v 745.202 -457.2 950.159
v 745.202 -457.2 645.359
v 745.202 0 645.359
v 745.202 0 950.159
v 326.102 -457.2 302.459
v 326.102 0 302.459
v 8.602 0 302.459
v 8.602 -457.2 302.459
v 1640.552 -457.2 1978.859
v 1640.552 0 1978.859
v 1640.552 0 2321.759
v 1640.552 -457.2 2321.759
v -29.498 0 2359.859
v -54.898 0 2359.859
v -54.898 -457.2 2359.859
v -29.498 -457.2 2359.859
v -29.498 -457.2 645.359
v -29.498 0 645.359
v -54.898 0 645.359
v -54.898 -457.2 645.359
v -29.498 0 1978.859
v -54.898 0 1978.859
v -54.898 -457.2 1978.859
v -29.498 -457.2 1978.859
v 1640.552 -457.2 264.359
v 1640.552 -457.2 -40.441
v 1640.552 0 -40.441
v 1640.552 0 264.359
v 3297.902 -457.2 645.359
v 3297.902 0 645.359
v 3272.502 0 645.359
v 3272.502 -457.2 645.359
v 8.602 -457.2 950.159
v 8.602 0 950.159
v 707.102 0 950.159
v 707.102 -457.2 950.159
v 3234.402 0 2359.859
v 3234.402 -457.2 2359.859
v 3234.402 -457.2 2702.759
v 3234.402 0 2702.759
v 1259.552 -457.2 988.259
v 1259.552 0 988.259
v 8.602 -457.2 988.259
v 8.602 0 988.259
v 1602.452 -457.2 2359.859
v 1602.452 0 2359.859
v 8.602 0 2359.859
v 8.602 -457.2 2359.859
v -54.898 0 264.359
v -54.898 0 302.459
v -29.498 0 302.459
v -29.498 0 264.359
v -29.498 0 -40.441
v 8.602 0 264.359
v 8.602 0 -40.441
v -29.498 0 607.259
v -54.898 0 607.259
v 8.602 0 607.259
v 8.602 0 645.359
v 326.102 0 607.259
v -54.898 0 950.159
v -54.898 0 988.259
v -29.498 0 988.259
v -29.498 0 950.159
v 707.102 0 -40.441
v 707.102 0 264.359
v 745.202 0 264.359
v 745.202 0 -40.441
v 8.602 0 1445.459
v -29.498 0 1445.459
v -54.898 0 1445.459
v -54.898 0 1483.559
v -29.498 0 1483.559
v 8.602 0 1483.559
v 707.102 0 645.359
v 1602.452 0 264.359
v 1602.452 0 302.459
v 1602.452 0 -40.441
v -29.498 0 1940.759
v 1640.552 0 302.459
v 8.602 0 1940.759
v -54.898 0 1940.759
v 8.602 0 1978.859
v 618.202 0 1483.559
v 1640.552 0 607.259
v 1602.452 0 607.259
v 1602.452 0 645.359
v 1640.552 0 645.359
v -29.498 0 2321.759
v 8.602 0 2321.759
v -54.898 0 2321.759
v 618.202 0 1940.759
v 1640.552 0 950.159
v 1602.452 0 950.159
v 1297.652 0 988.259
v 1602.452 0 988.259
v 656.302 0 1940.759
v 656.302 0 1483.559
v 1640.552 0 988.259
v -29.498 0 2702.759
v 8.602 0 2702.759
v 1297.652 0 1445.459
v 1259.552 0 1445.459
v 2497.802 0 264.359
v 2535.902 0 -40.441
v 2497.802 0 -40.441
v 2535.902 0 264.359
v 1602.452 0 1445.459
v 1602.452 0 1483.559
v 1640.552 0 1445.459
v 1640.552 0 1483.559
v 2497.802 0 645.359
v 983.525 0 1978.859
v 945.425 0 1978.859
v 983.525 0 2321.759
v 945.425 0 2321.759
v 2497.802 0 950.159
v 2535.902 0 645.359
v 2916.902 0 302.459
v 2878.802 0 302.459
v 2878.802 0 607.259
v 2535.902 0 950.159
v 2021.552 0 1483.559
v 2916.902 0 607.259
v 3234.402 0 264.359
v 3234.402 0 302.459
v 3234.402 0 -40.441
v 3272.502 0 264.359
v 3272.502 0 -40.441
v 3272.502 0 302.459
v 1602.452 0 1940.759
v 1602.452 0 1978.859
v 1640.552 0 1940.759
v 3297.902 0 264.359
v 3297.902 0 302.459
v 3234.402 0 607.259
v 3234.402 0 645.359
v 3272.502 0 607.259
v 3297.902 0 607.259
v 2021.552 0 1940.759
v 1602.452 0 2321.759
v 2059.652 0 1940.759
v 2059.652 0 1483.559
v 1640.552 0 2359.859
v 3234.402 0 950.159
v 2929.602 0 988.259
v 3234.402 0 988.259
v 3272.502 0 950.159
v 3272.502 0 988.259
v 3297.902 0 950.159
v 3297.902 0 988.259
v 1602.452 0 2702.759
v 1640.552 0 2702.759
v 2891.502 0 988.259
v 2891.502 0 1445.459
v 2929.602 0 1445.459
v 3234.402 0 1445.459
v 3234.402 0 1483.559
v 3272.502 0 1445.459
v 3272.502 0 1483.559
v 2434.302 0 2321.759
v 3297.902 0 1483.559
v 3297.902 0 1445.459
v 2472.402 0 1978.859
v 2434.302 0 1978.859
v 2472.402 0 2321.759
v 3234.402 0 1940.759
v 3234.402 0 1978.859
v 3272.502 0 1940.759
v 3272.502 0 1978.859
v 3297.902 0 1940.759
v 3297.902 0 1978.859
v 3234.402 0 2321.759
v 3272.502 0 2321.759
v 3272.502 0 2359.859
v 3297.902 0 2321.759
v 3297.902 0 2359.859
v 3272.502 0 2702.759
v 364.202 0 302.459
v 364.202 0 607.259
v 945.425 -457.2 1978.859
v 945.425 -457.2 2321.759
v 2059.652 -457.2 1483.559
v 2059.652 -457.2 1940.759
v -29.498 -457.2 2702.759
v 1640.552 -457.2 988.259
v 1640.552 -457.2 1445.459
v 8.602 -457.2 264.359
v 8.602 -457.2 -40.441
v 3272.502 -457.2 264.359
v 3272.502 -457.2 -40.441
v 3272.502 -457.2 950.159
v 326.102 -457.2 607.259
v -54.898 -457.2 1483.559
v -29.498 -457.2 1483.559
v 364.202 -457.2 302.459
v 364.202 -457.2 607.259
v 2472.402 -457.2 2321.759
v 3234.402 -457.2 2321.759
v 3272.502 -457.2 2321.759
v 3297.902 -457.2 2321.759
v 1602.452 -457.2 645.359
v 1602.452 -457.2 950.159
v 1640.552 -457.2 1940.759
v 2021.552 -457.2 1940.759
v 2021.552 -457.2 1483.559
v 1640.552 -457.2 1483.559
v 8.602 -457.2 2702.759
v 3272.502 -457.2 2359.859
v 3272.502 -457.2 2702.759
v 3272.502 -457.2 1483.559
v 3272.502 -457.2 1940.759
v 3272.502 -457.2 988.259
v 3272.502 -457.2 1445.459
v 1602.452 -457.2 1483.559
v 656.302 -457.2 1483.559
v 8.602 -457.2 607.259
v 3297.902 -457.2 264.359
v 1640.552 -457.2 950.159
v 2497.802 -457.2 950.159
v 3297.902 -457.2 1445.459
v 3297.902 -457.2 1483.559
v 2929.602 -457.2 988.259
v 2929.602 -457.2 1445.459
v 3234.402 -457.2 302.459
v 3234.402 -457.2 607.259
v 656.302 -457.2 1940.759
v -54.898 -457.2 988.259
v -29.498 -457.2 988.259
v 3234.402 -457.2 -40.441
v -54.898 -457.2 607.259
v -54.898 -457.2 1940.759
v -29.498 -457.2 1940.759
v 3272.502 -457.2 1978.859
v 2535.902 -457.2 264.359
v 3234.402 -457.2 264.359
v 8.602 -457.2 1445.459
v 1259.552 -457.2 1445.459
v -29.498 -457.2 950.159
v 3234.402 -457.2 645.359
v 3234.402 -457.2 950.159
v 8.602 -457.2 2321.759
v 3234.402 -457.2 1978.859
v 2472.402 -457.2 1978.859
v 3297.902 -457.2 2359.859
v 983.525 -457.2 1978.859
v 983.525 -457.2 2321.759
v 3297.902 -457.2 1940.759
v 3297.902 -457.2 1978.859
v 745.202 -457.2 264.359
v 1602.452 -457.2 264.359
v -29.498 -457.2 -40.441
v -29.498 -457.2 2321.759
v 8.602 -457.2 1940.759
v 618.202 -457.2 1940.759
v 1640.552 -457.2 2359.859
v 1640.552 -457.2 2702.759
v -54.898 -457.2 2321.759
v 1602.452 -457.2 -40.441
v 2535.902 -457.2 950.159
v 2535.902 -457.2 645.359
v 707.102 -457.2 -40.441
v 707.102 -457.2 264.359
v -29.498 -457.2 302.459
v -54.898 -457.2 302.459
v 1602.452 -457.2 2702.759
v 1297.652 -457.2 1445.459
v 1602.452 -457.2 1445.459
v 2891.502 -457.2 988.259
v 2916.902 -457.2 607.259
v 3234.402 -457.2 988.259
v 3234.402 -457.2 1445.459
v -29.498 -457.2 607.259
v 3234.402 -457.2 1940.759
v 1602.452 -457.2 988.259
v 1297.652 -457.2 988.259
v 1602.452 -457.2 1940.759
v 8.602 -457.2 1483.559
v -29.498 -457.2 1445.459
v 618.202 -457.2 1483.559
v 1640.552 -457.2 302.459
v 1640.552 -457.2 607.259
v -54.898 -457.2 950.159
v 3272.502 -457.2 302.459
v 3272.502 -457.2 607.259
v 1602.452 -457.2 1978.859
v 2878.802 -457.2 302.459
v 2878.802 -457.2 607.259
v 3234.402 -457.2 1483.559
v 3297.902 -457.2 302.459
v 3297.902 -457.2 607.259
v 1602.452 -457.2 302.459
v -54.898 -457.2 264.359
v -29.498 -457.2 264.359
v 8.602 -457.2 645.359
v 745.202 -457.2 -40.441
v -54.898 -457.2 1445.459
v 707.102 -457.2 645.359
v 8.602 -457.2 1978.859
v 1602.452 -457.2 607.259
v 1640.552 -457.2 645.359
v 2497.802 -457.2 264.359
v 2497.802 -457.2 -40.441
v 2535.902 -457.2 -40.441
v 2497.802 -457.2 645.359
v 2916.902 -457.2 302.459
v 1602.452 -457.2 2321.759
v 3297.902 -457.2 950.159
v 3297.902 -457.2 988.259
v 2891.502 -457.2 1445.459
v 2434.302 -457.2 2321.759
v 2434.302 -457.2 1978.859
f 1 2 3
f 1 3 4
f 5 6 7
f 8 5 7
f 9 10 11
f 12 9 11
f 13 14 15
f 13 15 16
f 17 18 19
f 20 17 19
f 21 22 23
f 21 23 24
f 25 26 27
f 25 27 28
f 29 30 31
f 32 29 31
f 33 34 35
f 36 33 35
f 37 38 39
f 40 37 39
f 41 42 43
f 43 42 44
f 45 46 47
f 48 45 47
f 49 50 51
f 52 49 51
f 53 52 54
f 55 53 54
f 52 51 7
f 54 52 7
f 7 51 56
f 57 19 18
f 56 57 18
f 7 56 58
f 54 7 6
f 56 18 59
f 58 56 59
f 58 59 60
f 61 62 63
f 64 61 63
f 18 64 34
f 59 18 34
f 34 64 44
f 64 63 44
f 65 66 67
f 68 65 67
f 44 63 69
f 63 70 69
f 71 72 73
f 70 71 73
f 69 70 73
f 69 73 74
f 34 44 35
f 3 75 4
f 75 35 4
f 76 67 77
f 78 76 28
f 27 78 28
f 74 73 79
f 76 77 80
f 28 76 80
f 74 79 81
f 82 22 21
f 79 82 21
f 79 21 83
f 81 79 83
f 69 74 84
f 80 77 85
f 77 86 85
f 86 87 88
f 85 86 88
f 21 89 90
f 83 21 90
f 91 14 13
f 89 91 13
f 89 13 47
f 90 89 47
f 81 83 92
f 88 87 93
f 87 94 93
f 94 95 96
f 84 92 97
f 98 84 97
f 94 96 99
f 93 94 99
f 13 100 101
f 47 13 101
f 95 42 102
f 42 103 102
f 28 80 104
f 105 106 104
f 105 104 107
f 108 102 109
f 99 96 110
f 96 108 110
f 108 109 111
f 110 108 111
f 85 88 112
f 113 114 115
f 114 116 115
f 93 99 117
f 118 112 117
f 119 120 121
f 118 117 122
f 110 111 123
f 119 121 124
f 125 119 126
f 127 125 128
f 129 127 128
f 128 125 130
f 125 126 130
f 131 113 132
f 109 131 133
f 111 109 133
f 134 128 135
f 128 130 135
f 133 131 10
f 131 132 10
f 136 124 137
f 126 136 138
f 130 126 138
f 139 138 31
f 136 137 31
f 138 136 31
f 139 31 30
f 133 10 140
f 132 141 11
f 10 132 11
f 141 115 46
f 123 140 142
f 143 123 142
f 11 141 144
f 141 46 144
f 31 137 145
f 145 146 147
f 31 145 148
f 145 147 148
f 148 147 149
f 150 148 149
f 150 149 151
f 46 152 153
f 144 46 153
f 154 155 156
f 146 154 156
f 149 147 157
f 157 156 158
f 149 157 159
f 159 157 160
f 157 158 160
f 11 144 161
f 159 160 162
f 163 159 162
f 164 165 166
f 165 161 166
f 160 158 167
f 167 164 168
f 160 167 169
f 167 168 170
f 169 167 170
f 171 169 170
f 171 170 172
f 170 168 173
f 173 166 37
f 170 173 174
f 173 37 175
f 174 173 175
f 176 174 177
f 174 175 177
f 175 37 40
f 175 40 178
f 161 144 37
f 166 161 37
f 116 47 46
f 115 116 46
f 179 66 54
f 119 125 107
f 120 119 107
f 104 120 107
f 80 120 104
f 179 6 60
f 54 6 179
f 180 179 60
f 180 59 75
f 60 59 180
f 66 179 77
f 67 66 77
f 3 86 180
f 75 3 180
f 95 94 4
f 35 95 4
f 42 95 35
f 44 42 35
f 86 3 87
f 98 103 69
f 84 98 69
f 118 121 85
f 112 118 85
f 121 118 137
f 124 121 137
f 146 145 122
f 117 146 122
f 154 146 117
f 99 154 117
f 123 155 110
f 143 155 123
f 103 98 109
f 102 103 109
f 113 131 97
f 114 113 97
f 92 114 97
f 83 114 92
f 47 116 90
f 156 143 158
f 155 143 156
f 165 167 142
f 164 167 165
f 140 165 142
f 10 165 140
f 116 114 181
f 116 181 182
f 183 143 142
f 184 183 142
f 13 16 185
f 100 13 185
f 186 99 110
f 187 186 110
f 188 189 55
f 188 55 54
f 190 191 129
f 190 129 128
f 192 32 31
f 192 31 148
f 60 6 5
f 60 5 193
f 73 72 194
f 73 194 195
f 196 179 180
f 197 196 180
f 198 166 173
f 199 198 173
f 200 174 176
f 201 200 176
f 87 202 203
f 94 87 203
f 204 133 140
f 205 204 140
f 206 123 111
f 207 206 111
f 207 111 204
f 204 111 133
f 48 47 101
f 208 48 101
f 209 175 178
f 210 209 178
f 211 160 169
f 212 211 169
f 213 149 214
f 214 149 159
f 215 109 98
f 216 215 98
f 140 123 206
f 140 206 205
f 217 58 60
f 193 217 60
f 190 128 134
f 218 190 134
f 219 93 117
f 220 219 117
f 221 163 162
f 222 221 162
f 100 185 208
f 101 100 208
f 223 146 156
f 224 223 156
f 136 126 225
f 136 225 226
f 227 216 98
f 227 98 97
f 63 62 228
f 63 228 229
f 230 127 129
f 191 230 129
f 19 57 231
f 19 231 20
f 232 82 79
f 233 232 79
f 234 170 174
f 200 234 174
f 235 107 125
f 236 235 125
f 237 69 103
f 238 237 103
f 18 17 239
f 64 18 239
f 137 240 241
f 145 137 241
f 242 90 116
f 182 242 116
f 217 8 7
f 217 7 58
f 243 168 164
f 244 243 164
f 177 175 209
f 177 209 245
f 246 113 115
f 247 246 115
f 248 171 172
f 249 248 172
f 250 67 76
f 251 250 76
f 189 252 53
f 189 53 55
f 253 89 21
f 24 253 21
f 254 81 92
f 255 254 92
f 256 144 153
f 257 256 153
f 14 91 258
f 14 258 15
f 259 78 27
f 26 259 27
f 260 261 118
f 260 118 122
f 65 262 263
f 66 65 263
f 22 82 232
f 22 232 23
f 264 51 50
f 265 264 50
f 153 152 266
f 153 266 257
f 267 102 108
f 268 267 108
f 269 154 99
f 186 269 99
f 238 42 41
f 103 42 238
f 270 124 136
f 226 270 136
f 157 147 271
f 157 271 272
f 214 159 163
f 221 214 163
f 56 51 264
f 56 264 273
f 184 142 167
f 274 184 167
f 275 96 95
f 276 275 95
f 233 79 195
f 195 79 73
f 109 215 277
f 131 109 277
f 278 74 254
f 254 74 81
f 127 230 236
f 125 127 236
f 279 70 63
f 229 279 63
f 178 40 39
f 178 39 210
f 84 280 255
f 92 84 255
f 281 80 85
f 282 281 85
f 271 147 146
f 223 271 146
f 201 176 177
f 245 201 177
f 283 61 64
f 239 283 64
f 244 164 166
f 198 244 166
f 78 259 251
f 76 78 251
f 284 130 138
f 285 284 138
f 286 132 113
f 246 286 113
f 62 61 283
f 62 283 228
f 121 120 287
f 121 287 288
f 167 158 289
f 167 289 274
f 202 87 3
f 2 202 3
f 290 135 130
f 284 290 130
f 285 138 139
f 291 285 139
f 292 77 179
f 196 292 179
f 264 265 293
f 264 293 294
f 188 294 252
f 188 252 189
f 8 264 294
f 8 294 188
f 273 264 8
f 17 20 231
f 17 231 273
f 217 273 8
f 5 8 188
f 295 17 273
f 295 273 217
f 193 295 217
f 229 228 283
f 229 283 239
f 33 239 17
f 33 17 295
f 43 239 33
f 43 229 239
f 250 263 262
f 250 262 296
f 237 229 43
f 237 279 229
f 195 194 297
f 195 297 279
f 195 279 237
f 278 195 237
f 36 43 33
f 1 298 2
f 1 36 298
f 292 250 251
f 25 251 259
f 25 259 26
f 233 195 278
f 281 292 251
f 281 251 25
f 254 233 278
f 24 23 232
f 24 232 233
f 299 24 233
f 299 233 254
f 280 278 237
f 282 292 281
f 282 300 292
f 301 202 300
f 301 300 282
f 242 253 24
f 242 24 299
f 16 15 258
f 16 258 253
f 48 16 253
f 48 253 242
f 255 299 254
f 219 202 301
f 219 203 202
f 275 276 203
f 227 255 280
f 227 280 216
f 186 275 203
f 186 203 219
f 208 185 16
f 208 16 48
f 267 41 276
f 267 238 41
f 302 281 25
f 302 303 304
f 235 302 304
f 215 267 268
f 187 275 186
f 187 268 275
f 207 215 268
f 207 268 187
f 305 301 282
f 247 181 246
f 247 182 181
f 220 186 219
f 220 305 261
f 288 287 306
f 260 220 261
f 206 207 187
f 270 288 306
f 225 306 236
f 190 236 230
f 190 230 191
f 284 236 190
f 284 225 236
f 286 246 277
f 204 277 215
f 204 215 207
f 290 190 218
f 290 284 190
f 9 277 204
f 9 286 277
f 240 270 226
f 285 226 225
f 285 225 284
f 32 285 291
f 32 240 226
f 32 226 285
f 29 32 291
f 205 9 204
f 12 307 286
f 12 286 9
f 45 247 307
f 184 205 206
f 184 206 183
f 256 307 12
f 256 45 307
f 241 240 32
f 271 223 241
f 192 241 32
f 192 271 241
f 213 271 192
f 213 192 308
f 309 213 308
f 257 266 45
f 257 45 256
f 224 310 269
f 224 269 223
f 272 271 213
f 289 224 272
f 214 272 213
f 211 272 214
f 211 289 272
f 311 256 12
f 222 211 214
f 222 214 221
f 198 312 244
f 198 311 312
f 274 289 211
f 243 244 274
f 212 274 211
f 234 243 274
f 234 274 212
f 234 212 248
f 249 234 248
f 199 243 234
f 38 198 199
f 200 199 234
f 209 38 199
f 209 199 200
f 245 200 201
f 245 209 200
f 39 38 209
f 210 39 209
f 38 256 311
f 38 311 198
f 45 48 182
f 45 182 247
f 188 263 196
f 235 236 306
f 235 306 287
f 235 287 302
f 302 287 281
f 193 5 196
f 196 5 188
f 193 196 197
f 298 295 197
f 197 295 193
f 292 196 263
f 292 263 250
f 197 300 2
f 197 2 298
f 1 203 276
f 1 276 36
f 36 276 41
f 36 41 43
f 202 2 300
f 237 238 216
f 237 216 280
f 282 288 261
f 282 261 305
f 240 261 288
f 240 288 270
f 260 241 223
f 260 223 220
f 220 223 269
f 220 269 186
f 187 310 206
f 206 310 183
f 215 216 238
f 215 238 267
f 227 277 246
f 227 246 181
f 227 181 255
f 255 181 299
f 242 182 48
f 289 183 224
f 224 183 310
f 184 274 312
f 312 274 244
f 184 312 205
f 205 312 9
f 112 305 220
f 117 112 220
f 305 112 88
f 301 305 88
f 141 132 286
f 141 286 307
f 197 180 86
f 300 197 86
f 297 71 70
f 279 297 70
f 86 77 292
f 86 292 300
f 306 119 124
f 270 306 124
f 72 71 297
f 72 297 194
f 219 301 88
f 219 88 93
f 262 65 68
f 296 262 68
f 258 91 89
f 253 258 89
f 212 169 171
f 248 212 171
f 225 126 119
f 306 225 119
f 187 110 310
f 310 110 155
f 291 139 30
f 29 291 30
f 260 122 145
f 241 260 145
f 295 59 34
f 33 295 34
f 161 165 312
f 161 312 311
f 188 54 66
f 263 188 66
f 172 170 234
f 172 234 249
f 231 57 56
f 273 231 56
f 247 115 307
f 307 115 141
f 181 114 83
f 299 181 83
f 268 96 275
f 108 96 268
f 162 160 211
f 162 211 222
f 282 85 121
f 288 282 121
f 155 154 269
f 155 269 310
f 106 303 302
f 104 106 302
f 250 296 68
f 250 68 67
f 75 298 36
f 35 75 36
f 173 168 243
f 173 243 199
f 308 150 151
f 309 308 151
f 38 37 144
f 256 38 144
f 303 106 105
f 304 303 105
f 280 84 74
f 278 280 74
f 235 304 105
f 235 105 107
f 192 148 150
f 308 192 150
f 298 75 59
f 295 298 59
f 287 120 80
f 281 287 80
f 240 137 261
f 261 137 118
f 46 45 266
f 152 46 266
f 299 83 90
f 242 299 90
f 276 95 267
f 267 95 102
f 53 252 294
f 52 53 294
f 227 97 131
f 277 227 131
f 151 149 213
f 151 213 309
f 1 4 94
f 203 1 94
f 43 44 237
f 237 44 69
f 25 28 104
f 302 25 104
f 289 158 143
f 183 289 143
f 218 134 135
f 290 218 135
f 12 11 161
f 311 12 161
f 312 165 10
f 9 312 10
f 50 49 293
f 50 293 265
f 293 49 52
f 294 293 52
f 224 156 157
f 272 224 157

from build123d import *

# Parameters (mm, degrees)
F0_W     = 38.1
F0_H     = 342.9
F0_W_2   = 25.4
F0_H_2   = 38.1
F0_H_3   = 457.2
F0_H_4   = 304.8
F1_DEPTH = 457.2


with BuildPart() as f1:
    # F0 (on Front) → F1 (new body)
    with BuildSketch(Plane.XZ):
        with Locations((-10.4476883292, 2531.308583796)):
            Rectangle(F0_W, F0_H)
        with Locations((-42.1976883292, 2340.808583796)):
            Rectangle(F0_W_2, F0_H_2)
        with Locations((-10.4476883292, 2340.808583796)):
            Rectangle(F0_W, F0_H_2)
        Polygon((1602.4523116708, 2359.858583796), (8.6023116708, 2359.858583796), (8.6023116708, 2321.758583796), (945.4248547554, 2321.758583796), (983.5248547554, 2321.758583796), (1602.4523116708, 2321.758583796), align=None)
        with Locations((-10.4476883292, 2150.308583796)):
            Rectangle(F0_W, F0_H)
        with Locations((1621.5023116708, 2531.308583796)):
            Rectangle(F0_W, F0_H)
        with Locations((1621.5023116708, 2340.808583796)):
            Rectangle(F0_W, F0_H_2)
        Polygon((3234.4023116708, 2359.858583796), (1640.5523116708, 2359.858583796), (1640.5523116708, 2321.758583796), (2434.3023116708, 2321.758583796), (2472.4023116708, 2321.758583796), (3234.4023116708, 2321.758583796), align=None)
        with Locations((1621.5023116708, 2150.308583796)):
            Rectangle(F0_W, F0_H)
        with Locations((964.4748547554, 2150.308583796)):
            Rectangle(F0_W, F0_H)
        Polygon((945.4248547554, 1978.858583796), (8.6023116708, 1978.858583796), (8.6023116708, 1940.758583796), (618.2023116708, 1940.758583796), (656.3023116708, 1940.758583796), (1602.4523116708, 1940.758583796), (1602.4523116708, 1978.858583796), (983.5248547554, 1978.858583796), align=None)
        with Locations((-10.4476883292, 1959.808583796)):
            Rectangle(F0_W, F0_H_2)
        with Locations((-42.1976883292, 1959.808583796)):
            Rectangle(F0_W_2, F0_H_2)
        with Locations((-10.4476883292, 1712.158583796)):
            Rectangle(F0_W, F0_H_3)
        with Locations((637.2523116708, 1712.158583796)):
            Rectangle(F0_W, F0_H_3)
        with Locations((-10.4476883292, 1464.508583796)):
            Rectangle(F0_W, F0_H_2)
        Polygon((618.2023116708, 1483.558583796), (8.6023116708, 1483.558583796), (8.6023116708, 1445.458583796), (1259.5523116708, 1445.458583796), (1297.6523116708, 1445.458583796), (1602.4523116708, 1445.458583796), (1602.4523116708, 1483.558583796), (656.3023116708, 1483.558583796), align=None)
        with Locations((-10.4476883292, 1216.858583796)):
            Rectangle(F0_W, F0_H_3)
        with Locations((-42.1976883292, 1464.508583796)):
            Rectangle(F0_W_2, F0_H_2)
        with Locations((-42.1976883292, 969.208583796)):
            Rectangle(F0_W_2, F0_H_2)
        with Locations((-42.1976883292, 626.308583796)):
            Rectangle(F0_W_2, F0_H_2)
        with Locations((-10.4476883292, 111.958583796)):
            Rectangle(F0_W, F0_H_4)
        with Locations((-42.1976883292, 283.408583796)):
            Rectangle(F0_W_2, F0_H_2)
        with Locations((-10.4476883292, 283.408583796)):
            Rectangle(F0_W, F0_H_2)
        with Locations((-10.4476883292, 454.858583796)):
            Rectangle(F0_W, F0_H_4)
        with Locations((-10.4476883292, 626.308583796)):
            Rectangle(F0_W, F0_H_2)
        with Locations((-10.4476883292, 797.758583796)):
            Rectangle(F0_W, F0_H_4)
        Polygon((707.1023116708, 645.358583796), (8.6023116708, 645.358583796), (8.6023116708, 607.258583796), (326.1023116708, 607.258583796), (364.2023116708, 607.258583796), (1602.4523116708, 607.258583796), (1640.5523116708, 607.258583796), (2878.8023116708, 607.258583796), (2916.9023116708, 607.258583796), (3234.4023116708, 607.258583796), (3234.4023116708, 645.358583796), (2535.9023116708, 645.358583796), (2497.8023116708, 645.358583796), (1640.5523116708, 645.358583796), (1602.4523116708, 645.358583796), (745.2023116708, 645.358583796), align=None)
        Polygon((1259.5523116708, 988.258583796), (8.6023116708, 988.258583796), (8.6023116708, 950.158583796), (707.1023116708, 950.158583796), (745.2023116708, 950.158583796), (1602.4523116708, 950.158583796), (1602.4523116708, 988.258583796), (1297.6523116708, 988.258583796), align=None)
        with Locations((726.1523116708, 797.758583796)):
            Rectangle(F0_W, F0_H_4)
        with Locations((-10.4476883292, 969.208583796)):
            Rectangle(F0_W, F0_H_2)
        with Locations((345.1523116708, 454.858583796)):
            Rectangle(F0_W, F0_H_4)
        Polygon((326.1023116708, 302.458583796), (8.6023116708, 302.458583796), (8.6023116708, 264.358583796), (707.1023116708, 264.358583796), (745.2023116708, 264.358583796), (1602.4523116708, 264.358583796), (1640.5523116708, 264.358583796), (2497.8023116708, 264.358583796), (2535.9023116708, 264.358583796), (3234.4023116708, 264.358583796), (3234.4023116708, 302.458583796), (2916.9023116708, 302.458583796), (2878.8023116708, 302.458583796), (1640.5523116708, 302.458583796), (1602.4523116708, 302.458583796), (364.2023116708, 302.458583796), align=None)
        with Locations((726.1523116708, 111.958583796)):
            Rectangle(F0_W, F0_H_4)
        with Locations((1278.6023116708, 1216.858583796)):
            Rectangle(F0_W, F0_H_3)
        with Locations((1621.5023116708, 1959.808583796)):
            Rectangle(F0_W, F0_H_2)
        with Locations((1621.5023116708, 1712.158583796)):
            Rectangle(F0_W, F0_H_3)
        with Locations((1621.5023116708, 1464.508583796)):
            Rectangle(F0_W, F0_H_2)
        with Locations((1621.5023116708, 1216.858583796)):
            Rectangle(F0_W, F0_H_3)
        with Locations((1621.5023116708, 969.208583796)):
            Rectangle(F0_W, F0_H_2)
        with Locations((1621.5023116708, 797.758583796)):
            Rectangle(F0_W, F0_H_4)
        with Locations((1621.5023116708, 454.858583796)):
            Rectangle(F0_W, F0_H_4)
        with Locations((1621.5023116708, 111.958583796)):
            Rectangle(F0_W, F0_H_4)
        with Locations((2040.6023116708, 1712.158583796)):
            Rectangle(F0_W, F0_H_3)
        Polygon((2434.3023116708, 1978.858583796), (1640.5523116708, 1978.858583796), (1640.5523116708, 1940.758583796), (2021.5523116708, 1940.758583796), (2059.6523116708, 1940.758583796), (3234.4023116708, 1940.758583796), (3234.4023116708, 1978.858583796), (2472.4023116708, 1978.858583796), align=None)
        with Locations((2453.3523116708, 2150.308583796)):
            Rectangle(F0_W, F0_H)
        with Locations((3253.4523116708, 2531.308583796)):
            Rectangle(F0_W, F0_H)
        with Locations((3253.4523116708, 2150.308583796)):
            Rectangle(F0_W, F0_H)
        with Locations((3253.4523116708, 1712.158583796)):
            Rectangle(F0_W, F0_H_3)
        with Locations((2910.5523116708, 1216.858583796)):
            Rectangle(F0_W, F0_H_3)
        Polygon((2021.5523116708, 1483.558583796), (1640.5523116708, 1483.558583796), (1640.5523116708, 1445.458583796), (2891.5023116708, 1445.458583796), (2929.6023116708, 1445.458583796), (3234.4023116708, 1445.458583796), (3234.4023116708, 1483.558583796), (2059.6523116708, 1483.558583796), align=None)
        Polygon((2891.5023116708, 988.258583796), (1640.5523116708, 988.258583796), (1640.5523116708, 950.158583796), (2497.8023116708, 950.158583796), (2535.9023116708, 950.158583796), (3234.4023116708, 950.158583796), (3234.4023116708, 988.258583796), (2929.6023116708, 988.258583796), align=None)
        with Locations((2516.8523116708, 797.758583796)):
            Rectangle(F0_W, F0_H_4)
        with Locations((2897.8523116708, 454.858583796)):
            Rectangle(F0_W, F0_H_4)
        with Locations((2516.8523116708, 111.958583796)):
            Rectangle(F0_W, F0_H_4)
        with Locations((3253.4523116708, 111.958583796)):
            Rectangle(F0_W, F0_H_4)
        with Locations((3253.4523116708, 283.408583796)):
            Rectangle(F0_W, F0_H_2)
        with Locations((3285.2023116708, 283.408583796)):
            Rectangle(F0_W_2, F0_H_2)
        with Locations((3253.4523116708, 454.858583796)):
            Rectangle(F0_W, F0_H_4)
        with Locations((3285.2023116708, 626.308583796)):
            Rectangle(F0_W_2, F0_H_2)
        with Locations((3253.4523116708, 626.308583796)):
            Rectangle(F0_W, F0_H_2)
        with Locations((3253.4523116708, 797.758583796)):
            Rectangle(F0_W, F0_H_4)
        with Locations((3253.4523116708, 969.208583796)):
            Rectangle(F0_W, F0_H_2)
        with Locations((3253.4523116708, 1216.858583796)):
            Rectangle(F0_W, F0_H_3)
        with Locations((3253.4523116708, 1464.508583796)):
            Rectangle(F0_W, F0_H_2)
        with Locations((3285.2023116708, 969.208583796)):
            Rectangle(F0_W_2, F0_H_2)
        with Locations((3285.2023116708, 1464.508583796)):
            Rectangle(F0_W_2, F0_H_2)
        with Locations((3253.4523116708, 1959.808583796)):
            Rectangle(F0_W, F0_H_2)
        with Locations((3285.2023116708, 1959.808583796)):
            Rectangle(F0_W_2, F0_H_2)
        with Locations((3253.4523116708, 2340.808583796)):
            Rectangle(F0_W, F0_H_2)
        with Locations((3285.2023116708, 2340.808583796)):
            Rectangle(F0_W_2, F0_H_2)
    extrude(amount=F1_DEPTH)


solid = f1.part
